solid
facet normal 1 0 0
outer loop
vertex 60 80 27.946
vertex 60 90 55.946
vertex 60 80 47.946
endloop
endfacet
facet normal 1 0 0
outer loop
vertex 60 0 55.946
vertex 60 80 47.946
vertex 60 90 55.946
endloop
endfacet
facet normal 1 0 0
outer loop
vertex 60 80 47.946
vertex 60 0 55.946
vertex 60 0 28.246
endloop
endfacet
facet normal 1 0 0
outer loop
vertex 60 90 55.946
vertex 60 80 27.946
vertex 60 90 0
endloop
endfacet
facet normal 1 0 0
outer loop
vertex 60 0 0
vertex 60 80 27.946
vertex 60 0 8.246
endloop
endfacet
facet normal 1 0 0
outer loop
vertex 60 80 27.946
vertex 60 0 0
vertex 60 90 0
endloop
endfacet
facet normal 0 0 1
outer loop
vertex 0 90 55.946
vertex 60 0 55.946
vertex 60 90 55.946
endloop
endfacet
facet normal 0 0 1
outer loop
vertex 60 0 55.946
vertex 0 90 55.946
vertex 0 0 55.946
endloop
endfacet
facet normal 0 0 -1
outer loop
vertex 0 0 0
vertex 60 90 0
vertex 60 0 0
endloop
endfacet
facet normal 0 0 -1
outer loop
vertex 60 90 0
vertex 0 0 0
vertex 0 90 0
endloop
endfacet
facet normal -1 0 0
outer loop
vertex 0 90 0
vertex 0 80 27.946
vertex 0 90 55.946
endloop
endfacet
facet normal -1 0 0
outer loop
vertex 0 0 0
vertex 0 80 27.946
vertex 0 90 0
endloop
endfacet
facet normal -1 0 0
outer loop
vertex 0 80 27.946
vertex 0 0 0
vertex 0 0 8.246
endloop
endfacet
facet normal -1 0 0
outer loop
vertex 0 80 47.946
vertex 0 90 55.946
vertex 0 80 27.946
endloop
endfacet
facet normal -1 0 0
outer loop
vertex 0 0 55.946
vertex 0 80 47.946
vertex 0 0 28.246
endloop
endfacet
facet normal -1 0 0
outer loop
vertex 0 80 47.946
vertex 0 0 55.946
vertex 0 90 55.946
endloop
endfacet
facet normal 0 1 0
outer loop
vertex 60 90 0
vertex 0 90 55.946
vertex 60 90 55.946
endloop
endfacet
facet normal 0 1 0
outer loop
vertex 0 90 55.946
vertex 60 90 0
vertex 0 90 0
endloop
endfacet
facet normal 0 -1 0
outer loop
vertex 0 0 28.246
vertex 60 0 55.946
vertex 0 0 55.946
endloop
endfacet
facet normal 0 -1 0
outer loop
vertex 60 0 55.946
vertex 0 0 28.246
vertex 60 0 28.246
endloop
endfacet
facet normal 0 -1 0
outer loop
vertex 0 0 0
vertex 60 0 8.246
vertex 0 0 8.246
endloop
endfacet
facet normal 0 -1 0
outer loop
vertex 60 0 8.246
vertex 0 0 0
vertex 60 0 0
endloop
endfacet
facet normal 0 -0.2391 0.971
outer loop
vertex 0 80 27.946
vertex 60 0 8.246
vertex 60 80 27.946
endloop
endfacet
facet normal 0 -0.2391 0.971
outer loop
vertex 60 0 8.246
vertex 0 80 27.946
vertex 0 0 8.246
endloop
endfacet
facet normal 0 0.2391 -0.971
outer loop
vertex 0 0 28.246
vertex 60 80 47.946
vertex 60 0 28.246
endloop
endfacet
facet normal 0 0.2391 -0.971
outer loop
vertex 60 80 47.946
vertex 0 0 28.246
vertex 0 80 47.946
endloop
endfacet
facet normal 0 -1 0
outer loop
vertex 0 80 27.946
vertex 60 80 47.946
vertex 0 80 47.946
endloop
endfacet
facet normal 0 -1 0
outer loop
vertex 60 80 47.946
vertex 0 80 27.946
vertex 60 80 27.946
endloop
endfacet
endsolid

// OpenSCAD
// Tablet Clamp Wedge Adapter
// 傾斜した天板（14°）でタブレットクランプを水平に保つための治具
// コの字型で天板を挟み、クランプは水平面を挟める
// C-shaped adapter for tilted desk - clamp grips horizontal surfaces
//
// 設計思想：
// - 天板は手前に14°傾斜している
// - クランプは天板の奥側に取り付ける
// - この治具の外側（上面・下面）は水平 → クランプが水平に挟める
// - 治具の内側は天板の傾斜に沿った角度
// - コの字型で手前が開口（天板を奥からスライドして装着）

// ========================================
// Parameters
// ========================================

// Desk parameters
desk_tilt_angle = 14;      // 天板の傾斜角度 (degrees)
desk_thickness = 18;       // 天板の厚み (mm)

// Clamp parameters
clamp_grip_diameter = 45;  // クランプの抑える部分の直径 (mm)
clamp_base_depth = 80;     // クランプ台座の奥行き (mm)
clamp_base_width = 50;     // クランプ台座の幅 (mm)

// Adapter parameters
adapter_margin = 5;        // 台座より少し大きくするためのマージン (mm)
adapter_width = clamp_base_width + adapter_margin * 2;   // アダプターの幅
adapter_depth = clamp_base_depth + adapter_margin * 2;   // アダプターの奥行き

// 天板スロットのパラメータ
slot_tolerance = 1.0;      // 天板を入れやすくするための余裕 (mm)
slot_opening_depth = adapter_depth - 10;  // コの字の開口部の奥行き（奥10mmは壁）

// 上下のクランプ挟み込み部分の厚み
min_wall_thickness = 8;    // 最小壁厚（強度確保）

// 3D印刷用の調整
print_tolerance = 0.3;

// ========================================
// Calculated dimensions
// ========================================

// 天板スロットの高さ（公差込み）
slot_height = desk_thickness + slot_tolerance * 2;

// 傾斜による高さの差（スロット開口部の奥行きに基づく）
tilt_height_diff = tan(desk_tilt_angle) * slot_opening_depth;

// 全体の高さ
// 奥側（最も高い位置）を基準：下部壁(厚い) + スロット + 上部壁(薄い)
// = min_wall_thickness + tilt_height_diff + slot_height + min_wall_thickness
total_height = min_wall_thickness * 2 + tilt_height_diff + slot_height;

// ========================================
// Modules
// ========================================

// 傾斜した天板スロット（くり抜き用）
module tilted_slot() {
    // 天板の傾斜に合わせたスロット
    // 天板は手前に傾いている → 手前が低く、奥が高い
    // Y軸: 手前=0、奥=adapter_depth

    slot_extra = 1;  // はみ出し用マージン

    // スロットの下面位置
    // 手前が低い（下部壁が薄い）、奥が高い（下部壁が厚い）
    slot_bottom_front = min_wall_thickness;
    slot_bottom_back = min_wall_thickness + tan(desk_tilt_angle) * slot_opening_depth;

    // スロットの上面位置（下面 + 天板厚み）
    slot_top_front = slot_bottom_front + slot_height;
    slot_top_back = slot_bottom_back + slot_height;

    // 傾斜したスロットをpolyhedronで作成
    points = [
        // 底面（天板下面に沿う傾斜：手前が低く、奥が高い）
        [-slot_extra, -slot_extra, slot_bottom_front],                    // 0: 手前左下
        [adapter_width + slot_extra, -slot_extra, slot_bottom_front],     // 1: 手前右下
        [adapter_width + slot_extra, slot_opening_depth, slot_bottom_back], // 2: 奥右下
        [-slot_extra, slot_opening_depth, slot_bottom_back],              // 3: 奥左下

        // 上面（天板上面に沿う傾斜：手前が低く、奥が高い）
        [-slot_extra, -slot_extra, slot_top_front],                       // 4: 手前左上
        [adapter_width + slot_extra, -slot_extra, slot_top_front],        // 5: 手前右上
        [adapter_width + slot_extra, slot_opening_depth, slot_top_back],  // 6: 奥右上
        [-slot_extra, slot_opening_depth, slot_top_back]                  // 7: 奥左上
    ];

    faces = [
        [0, 3, 2, 1],     // 底面
        [4, 5, 6, 7],     // 上面
        [0, 1, 5, 4],     // 手前面
        [2, 3, 7, 6],     // 奥面
        [0, 4, 7, 3],     // 左側面
        [1, 2, 6, 5]      // 右側面
    ];

    polyhedron(points = points, faces = faces);
}

// 外形ブロック（水平な上面と下面）
module outer_block() {
    cube([adapter_width, adapter_depth, total_height]);
}

// コの字型アダプター本体
module adapter_body() {
    difference() {
        outer_block();
        tilted_slot();
    }
}

// 完成したアダプター
module tablet_clamp_adapter() {
    adapter_body();
}

// ========================================
// Render
// ========================================

tablet_clamp_adapter();

// ========================================
// Debug info
// ========================================

// 壁厚の計算（デバッグ用）
lower_wall_front = min_wall_thickness;
lower_wall_back = min_wall_thickness + tilt_height_diff;
upper_wall_front = total_height - (min_wall_thickness + slot_height);
upper_wall_back = total_height - (min_wall_thickness + tilt_height_diff + slot_height);

echo("=== Tablet Clamp Adapter Dimensions ===");
echo(str("Desk tilt angle: ", desk_tilt_angle, " degrees"));
echo(str("Desk thickness: ", desk_thickness, " mm"));
echo(str("Adapter width: ", adapter_width, " mm"));
echo(str("Adapter depth: ", adapter_depth, " mm"));
echo(str("Total height: ", total_height, " mm"));
echo(str("Slot height (with tolerance): ", slot_height, " mm"));
echo(str("Tilt compensation: ", tilt_height_diff, " mm"));
echo("--- Wall Thickness ---");
echo(str("Lower wall (front/back): ", lower_wall_front, " / ", lower_wall_back, " mm"));
echo(str("Upper wall (front/back): ", upper_wall_front, " / ", upper_wall_back, " mm"));
